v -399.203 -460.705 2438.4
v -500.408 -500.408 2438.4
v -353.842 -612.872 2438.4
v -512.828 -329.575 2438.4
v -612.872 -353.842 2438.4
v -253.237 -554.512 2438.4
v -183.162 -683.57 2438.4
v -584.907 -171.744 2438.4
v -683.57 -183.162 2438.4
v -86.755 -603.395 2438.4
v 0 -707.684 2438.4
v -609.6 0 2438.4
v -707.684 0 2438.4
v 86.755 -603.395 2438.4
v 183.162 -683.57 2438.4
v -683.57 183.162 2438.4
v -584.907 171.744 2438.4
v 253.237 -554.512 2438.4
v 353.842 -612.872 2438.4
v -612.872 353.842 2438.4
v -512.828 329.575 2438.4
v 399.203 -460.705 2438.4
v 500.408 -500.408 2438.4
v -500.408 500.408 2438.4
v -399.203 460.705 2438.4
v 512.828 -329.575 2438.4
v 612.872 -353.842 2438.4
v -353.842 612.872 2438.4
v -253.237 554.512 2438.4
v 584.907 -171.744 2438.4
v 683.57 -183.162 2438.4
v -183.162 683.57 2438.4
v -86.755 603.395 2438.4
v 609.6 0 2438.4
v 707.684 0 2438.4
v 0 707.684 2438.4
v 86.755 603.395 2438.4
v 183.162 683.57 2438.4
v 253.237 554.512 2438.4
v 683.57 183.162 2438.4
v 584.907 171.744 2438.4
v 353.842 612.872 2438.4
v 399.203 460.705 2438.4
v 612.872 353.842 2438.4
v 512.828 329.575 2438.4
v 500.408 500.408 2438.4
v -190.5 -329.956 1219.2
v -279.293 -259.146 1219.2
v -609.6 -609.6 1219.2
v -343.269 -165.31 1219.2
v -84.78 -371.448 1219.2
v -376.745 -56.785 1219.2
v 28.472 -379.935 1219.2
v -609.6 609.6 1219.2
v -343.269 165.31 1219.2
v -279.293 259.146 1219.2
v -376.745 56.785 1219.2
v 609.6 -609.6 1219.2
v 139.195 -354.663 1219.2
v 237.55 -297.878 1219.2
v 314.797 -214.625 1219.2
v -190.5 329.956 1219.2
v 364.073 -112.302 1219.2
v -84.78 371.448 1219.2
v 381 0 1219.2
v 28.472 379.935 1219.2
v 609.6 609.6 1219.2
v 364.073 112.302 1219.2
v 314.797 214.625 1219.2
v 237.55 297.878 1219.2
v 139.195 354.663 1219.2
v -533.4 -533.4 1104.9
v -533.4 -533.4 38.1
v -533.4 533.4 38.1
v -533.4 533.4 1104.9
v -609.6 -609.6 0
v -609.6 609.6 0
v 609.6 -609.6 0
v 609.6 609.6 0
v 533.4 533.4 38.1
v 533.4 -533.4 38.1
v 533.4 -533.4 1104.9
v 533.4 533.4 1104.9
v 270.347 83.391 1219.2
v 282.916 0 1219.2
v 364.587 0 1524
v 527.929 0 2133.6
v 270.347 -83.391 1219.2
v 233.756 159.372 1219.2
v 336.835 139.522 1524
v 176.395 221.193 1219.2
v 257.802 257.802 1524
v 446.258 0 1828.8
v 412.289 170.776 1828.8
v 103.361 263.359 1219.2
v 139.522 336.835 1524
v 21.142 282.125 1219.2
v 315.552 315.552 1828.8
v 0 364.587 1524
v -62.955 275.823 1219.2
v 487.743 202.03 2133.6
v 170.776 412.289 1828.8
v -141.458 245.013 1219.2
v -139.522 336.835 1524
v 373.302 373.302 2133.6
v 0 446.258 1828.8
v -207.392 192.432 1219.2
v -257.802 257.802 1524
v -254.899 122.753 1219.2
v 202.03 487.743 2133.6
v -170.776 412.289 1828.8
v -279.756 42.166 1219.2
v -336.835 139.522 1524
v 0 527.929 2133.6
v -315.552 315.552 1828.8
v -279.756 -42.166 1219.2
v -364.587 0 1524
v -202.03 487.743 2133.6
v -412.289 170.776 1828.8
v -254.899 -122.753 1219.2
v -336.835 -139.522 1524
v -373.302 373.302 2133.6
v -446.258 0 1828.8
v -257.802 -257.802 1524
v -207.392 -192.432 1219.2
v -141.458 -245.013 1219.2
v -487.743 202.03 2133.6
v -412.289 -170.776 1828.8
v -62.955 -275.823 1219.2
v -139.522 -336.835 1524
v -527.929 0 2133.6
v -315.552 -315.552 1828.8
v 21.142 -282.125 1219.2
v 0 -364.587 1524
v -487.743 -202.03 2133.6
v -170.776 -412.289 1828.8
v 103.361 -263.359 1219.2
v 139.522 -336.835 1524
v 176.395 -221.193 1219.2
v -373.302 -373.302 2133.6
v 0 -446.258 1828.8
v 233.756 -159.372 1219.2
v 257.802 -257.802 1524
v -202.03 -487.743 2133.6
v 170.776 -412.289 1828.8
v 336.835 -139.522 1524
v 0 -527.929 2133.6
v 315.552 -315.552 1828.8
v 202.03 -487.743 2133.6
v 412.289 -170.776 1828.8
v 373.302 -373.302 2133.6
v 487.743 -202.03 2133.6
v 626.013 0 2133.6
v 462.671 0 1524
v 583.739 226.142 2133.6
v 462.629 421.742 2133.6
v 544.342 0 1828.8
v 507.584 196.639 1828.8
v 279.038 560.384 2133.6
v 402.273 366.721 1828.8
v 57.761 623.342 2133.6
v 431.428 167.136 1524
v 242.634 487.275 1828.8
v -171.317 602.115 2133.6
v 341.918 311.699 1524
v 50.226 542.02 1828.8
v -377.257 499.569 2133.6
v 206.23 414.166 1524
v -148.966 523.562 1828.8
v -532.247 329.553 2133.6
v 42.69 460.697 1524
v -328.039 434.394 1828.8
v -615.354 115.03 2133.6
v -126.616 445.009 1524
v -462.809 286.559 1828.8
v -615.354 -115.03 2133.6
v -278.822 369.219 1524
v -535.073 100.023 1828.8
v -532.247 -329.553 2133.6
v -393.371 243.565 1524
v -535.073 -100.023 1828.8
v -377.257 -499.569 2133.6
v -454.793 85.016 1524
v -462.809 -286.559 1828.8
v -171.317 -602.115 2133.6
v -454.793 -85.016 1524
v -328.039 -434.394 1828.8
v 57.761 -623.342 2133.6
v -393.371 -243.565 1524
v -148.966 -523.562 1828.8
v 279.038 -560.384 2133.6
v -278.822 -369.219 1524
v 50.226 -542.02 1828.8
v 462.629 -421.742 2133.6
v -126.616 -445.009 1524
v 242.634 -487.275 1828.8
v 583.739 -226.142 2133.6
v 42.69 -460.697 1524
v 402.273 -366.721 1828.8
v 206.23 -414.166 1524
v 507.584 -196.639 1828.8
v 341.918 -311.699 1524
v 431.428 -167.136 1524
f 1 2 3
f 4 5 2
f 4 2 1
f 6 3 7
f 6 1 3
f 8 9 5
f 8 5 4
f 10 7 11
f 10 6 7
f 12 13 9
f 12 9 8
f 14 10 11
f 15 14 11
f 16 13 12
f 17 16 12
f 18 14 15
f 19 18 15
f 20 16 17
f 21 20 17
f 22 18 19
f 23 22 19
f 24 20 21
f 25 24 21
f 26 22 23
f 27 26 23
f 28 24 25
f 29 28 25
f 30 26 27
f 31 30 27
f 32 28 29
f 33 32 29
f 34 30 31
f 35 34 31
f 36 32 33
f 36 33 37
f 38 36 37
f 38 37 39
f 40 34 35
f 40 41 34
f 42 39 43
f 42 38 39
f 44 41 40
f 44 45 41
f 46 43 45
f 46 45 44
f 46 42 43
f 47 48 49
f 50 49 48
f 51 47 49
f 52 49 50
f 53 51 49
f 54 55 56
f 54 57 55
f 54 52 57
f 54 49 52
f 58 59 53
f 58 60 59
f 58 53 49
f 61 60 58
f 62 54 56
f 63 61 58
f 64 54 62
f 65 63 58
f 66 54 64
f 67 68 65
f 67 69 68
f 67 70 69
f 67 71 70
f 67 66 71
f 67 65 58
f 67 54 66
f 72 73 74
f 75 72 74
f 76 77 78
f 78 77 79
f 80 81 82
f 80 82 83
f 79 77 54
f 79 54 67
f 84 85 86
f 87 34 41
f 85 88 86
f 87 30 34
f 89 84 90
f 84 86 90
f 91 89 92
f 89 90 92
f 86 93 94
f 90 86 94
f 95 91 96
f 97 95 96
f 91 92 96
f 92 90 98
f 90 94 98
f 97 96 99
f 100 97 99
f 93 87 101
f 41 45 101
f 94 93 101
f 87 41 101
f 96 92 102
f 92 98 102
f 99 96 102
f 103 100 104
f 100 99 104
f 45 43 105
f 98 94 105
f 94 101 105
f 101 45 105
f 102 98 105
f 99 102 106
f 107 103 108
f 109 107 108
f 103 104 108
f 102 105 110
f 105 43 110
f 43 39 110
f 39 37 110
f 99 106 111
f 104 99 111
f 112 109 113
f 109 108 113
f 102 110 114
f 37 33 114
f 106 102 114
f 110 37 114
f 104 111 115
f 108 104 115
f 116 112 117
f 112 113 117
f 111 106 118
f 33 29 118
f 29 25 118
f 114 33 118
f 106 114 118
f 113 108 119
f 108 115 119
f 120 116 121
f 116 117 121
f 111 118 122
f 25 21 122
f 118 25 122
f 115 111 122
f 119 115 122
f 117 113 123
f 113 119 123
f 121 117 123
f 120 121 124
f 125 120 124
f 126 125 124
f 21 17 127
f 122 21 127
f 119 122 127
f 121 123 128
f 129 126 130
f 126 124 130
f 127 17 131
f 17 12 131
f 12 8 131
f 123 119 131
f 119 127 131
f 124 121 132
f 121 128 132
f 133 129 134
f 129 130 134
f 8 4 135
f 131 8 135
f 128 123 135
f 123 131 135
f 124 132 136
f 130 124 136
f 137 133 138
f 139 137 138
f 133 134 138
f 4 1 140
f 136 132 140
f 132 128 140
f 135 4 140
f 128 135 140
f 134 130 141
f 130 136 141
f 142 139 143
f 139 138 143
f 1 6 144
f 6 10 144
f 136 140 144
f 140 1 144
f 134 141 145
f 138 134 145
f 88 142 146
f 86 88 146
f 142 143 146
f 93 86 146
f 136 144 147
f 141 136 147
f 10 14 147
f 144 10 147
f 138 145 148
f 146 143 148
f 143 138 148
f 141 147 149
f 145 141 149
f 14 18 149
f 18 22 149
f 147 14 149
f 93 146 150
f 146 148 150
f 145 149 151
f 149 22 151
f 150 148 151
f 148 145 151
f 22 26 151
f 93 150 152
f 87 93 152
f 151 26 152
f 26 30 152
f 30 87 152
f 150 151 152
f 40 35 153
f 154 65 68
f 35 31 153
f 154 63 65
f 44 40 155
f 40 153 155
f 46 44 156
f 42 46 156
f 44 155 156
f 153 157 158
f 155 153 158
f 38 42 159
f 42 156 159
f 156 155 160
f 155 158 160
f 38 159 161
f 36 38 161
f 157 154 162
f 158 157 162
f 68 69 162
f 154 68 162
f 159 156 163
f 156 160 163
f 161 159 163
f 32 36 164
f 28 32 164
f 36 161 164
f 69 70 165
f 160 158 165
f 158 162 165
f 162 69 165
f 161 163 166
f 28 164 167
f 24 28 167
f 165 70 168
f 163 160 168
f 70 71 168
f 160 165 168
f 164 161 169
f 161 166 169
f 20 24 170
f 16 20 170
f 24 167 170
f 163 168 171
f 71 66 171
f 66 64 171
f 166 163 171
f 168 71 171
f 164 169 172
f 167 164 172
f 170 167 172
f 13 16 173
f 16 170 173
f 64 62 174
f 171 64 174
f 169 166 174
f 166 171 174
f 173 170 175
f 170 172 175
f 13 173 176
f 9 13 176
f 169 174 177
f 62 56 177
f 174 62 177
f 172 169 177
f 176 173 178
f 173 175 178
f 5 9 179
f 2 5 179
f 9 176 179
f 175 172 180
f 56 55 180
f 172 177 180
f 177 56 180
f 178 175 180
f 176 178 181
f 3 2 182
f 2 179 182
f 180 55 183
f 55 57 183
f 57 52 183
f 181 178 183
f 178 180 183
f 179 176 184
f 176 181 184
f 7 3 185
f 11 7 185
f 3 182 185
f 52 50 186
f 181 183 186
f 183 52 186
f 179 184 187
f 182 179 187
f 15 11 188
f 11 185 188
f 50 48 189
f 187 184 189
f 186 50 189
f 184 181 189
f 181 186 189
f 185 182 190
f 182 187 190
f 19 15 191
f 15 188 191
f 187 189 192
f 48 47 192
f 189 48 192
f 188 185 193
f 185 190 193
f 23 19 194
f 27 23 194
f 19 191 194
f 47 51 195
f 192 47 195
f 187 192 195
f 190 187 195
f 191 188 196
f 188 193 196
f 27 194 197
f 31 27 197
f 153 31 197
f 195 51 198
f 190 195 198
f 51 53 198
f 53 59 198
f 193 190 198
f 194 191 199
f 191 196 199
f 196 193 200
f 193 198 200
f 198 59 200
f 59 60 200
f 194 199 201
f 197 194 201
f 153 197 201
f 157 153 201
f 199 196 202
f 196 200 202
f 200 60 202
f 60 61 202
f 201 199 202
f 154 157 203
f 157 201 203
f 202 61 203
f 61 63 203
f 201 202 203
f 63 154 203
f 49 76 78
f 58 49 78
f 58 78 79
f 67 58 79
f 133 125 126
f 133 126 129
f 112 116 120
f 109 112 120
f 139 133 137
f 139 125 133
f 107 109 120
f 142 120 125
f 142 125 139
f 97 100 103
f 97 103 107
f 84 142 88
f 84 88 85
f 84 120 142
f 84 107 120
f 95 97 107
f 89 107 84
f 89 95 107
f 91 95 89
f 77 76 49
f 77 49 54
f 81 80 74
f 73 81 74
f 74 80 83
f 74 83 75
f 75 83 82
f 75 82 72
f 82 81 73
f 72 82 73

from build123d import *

# Parameters (mm, degrees)
SKETCH1_W           = 1219.2
SKETCH1_H           = 1219.2
BOSS_EXTRUDE1_DEPTH = 1219.2
SKETCH2_R           = 381
BOSS_EXTRUDE2_DEPTH = 1219.2
BOSS_EXTRUDE2_DRAFT = -15
SKETCH3_R           = 609.6
CUT_EXTRUDE1_DEPTH  = 1219.2
CUT_EXTRUDE1_DRAFT  = -15
CUT_EXTRUDE2_START  = -38.1
SKETCH4_W           = 1066.8
SKETCH4_H           = 1066.8
CUT_EXTRUDE2_DEPTH  = 1066.8


with BuildPart() as part:
    # Sketch1 → Boss-Extrude1 (new body)
    with BuildSketch(Plane.XY):
        Rectangle(SKETCH1_W, SKETCH1_H)
    extrude(amount=BOSS_EXTRUDE1_DEPTH)


with BuildPart() as boss_extrude2_tool:
    # Sketch2 → Boss-Extrude2 (with draft: the straight prism first)
    with BuildSketch(Plane.XY.offset(1219.2)):
        Circle(SKETCH2_R)
    extrude(amount=BOSS_EXTRUDE2_DEPTH)
    # Boss-Extrude2: the draft: its side faces are tilted about the plane it starts from
    boss_extrude2_sides = [boss_extrude2_tool.faces().sort_by_distance(p)[0] for p in [
        (-381, 0, 1828.8),
    ]]
    draft(boss_extrude2_sides, Plane.XY.offset(1219.2), BOSS_EXTRUDE2_DRAFT)


with BuildPart() as part_1:
    add(part.part)

    # Boss-Extrude2: add boss_extrude2_tool
    add(boss_extrude2_tool.part)


with BuildPart() as cut_extrude1_tool:
    # Sketch3 → Cut-Extrude1 (with draft: the straight prism first)
    with BuildSketch(Plane.XY.offset(2438.4)):
        Circle(SKETCH3_R)
    extrude(amount=-CUT_EXTRUDE1_DEPTH)
    # Cut-Extrude1: the draft: its side faces are tilted about the plane it starts from
    cut_extrude1_sides = [cut_extrude1_tool.faces().sort_by_distance(p)[0] for p in [
        (-609.6, 0, 1828.8),
    ]]
    draft(cut_extrude1_sides, Plane.XY.offset(2438.4), CUT_EXTRUDE1_DRAFT)


with BuildPart() as part_2:
    add(part_1.part)

    # Cut-Extrude1: cut by cut_extrude1_tool
    add(cut_extrude1_tool.part, mode=Mode.SUBTRACT)

    # Sketch4 → Cut-Extrude2 (cut)
    with BuildSketch(Plane(origin=(0, 0, 0), x_dir=(-1, 0, 0), z_dir=(0, 0, -1)).offset(CUT_EXTRUDE2_START)):
        Rectangle(SKETCH4_W, SKETCH4_H)
    extrude(amount=-CUT_EXTRUDE2_DEPTH, mode=Mode.SUBTRACT)


solid = part_2.part
